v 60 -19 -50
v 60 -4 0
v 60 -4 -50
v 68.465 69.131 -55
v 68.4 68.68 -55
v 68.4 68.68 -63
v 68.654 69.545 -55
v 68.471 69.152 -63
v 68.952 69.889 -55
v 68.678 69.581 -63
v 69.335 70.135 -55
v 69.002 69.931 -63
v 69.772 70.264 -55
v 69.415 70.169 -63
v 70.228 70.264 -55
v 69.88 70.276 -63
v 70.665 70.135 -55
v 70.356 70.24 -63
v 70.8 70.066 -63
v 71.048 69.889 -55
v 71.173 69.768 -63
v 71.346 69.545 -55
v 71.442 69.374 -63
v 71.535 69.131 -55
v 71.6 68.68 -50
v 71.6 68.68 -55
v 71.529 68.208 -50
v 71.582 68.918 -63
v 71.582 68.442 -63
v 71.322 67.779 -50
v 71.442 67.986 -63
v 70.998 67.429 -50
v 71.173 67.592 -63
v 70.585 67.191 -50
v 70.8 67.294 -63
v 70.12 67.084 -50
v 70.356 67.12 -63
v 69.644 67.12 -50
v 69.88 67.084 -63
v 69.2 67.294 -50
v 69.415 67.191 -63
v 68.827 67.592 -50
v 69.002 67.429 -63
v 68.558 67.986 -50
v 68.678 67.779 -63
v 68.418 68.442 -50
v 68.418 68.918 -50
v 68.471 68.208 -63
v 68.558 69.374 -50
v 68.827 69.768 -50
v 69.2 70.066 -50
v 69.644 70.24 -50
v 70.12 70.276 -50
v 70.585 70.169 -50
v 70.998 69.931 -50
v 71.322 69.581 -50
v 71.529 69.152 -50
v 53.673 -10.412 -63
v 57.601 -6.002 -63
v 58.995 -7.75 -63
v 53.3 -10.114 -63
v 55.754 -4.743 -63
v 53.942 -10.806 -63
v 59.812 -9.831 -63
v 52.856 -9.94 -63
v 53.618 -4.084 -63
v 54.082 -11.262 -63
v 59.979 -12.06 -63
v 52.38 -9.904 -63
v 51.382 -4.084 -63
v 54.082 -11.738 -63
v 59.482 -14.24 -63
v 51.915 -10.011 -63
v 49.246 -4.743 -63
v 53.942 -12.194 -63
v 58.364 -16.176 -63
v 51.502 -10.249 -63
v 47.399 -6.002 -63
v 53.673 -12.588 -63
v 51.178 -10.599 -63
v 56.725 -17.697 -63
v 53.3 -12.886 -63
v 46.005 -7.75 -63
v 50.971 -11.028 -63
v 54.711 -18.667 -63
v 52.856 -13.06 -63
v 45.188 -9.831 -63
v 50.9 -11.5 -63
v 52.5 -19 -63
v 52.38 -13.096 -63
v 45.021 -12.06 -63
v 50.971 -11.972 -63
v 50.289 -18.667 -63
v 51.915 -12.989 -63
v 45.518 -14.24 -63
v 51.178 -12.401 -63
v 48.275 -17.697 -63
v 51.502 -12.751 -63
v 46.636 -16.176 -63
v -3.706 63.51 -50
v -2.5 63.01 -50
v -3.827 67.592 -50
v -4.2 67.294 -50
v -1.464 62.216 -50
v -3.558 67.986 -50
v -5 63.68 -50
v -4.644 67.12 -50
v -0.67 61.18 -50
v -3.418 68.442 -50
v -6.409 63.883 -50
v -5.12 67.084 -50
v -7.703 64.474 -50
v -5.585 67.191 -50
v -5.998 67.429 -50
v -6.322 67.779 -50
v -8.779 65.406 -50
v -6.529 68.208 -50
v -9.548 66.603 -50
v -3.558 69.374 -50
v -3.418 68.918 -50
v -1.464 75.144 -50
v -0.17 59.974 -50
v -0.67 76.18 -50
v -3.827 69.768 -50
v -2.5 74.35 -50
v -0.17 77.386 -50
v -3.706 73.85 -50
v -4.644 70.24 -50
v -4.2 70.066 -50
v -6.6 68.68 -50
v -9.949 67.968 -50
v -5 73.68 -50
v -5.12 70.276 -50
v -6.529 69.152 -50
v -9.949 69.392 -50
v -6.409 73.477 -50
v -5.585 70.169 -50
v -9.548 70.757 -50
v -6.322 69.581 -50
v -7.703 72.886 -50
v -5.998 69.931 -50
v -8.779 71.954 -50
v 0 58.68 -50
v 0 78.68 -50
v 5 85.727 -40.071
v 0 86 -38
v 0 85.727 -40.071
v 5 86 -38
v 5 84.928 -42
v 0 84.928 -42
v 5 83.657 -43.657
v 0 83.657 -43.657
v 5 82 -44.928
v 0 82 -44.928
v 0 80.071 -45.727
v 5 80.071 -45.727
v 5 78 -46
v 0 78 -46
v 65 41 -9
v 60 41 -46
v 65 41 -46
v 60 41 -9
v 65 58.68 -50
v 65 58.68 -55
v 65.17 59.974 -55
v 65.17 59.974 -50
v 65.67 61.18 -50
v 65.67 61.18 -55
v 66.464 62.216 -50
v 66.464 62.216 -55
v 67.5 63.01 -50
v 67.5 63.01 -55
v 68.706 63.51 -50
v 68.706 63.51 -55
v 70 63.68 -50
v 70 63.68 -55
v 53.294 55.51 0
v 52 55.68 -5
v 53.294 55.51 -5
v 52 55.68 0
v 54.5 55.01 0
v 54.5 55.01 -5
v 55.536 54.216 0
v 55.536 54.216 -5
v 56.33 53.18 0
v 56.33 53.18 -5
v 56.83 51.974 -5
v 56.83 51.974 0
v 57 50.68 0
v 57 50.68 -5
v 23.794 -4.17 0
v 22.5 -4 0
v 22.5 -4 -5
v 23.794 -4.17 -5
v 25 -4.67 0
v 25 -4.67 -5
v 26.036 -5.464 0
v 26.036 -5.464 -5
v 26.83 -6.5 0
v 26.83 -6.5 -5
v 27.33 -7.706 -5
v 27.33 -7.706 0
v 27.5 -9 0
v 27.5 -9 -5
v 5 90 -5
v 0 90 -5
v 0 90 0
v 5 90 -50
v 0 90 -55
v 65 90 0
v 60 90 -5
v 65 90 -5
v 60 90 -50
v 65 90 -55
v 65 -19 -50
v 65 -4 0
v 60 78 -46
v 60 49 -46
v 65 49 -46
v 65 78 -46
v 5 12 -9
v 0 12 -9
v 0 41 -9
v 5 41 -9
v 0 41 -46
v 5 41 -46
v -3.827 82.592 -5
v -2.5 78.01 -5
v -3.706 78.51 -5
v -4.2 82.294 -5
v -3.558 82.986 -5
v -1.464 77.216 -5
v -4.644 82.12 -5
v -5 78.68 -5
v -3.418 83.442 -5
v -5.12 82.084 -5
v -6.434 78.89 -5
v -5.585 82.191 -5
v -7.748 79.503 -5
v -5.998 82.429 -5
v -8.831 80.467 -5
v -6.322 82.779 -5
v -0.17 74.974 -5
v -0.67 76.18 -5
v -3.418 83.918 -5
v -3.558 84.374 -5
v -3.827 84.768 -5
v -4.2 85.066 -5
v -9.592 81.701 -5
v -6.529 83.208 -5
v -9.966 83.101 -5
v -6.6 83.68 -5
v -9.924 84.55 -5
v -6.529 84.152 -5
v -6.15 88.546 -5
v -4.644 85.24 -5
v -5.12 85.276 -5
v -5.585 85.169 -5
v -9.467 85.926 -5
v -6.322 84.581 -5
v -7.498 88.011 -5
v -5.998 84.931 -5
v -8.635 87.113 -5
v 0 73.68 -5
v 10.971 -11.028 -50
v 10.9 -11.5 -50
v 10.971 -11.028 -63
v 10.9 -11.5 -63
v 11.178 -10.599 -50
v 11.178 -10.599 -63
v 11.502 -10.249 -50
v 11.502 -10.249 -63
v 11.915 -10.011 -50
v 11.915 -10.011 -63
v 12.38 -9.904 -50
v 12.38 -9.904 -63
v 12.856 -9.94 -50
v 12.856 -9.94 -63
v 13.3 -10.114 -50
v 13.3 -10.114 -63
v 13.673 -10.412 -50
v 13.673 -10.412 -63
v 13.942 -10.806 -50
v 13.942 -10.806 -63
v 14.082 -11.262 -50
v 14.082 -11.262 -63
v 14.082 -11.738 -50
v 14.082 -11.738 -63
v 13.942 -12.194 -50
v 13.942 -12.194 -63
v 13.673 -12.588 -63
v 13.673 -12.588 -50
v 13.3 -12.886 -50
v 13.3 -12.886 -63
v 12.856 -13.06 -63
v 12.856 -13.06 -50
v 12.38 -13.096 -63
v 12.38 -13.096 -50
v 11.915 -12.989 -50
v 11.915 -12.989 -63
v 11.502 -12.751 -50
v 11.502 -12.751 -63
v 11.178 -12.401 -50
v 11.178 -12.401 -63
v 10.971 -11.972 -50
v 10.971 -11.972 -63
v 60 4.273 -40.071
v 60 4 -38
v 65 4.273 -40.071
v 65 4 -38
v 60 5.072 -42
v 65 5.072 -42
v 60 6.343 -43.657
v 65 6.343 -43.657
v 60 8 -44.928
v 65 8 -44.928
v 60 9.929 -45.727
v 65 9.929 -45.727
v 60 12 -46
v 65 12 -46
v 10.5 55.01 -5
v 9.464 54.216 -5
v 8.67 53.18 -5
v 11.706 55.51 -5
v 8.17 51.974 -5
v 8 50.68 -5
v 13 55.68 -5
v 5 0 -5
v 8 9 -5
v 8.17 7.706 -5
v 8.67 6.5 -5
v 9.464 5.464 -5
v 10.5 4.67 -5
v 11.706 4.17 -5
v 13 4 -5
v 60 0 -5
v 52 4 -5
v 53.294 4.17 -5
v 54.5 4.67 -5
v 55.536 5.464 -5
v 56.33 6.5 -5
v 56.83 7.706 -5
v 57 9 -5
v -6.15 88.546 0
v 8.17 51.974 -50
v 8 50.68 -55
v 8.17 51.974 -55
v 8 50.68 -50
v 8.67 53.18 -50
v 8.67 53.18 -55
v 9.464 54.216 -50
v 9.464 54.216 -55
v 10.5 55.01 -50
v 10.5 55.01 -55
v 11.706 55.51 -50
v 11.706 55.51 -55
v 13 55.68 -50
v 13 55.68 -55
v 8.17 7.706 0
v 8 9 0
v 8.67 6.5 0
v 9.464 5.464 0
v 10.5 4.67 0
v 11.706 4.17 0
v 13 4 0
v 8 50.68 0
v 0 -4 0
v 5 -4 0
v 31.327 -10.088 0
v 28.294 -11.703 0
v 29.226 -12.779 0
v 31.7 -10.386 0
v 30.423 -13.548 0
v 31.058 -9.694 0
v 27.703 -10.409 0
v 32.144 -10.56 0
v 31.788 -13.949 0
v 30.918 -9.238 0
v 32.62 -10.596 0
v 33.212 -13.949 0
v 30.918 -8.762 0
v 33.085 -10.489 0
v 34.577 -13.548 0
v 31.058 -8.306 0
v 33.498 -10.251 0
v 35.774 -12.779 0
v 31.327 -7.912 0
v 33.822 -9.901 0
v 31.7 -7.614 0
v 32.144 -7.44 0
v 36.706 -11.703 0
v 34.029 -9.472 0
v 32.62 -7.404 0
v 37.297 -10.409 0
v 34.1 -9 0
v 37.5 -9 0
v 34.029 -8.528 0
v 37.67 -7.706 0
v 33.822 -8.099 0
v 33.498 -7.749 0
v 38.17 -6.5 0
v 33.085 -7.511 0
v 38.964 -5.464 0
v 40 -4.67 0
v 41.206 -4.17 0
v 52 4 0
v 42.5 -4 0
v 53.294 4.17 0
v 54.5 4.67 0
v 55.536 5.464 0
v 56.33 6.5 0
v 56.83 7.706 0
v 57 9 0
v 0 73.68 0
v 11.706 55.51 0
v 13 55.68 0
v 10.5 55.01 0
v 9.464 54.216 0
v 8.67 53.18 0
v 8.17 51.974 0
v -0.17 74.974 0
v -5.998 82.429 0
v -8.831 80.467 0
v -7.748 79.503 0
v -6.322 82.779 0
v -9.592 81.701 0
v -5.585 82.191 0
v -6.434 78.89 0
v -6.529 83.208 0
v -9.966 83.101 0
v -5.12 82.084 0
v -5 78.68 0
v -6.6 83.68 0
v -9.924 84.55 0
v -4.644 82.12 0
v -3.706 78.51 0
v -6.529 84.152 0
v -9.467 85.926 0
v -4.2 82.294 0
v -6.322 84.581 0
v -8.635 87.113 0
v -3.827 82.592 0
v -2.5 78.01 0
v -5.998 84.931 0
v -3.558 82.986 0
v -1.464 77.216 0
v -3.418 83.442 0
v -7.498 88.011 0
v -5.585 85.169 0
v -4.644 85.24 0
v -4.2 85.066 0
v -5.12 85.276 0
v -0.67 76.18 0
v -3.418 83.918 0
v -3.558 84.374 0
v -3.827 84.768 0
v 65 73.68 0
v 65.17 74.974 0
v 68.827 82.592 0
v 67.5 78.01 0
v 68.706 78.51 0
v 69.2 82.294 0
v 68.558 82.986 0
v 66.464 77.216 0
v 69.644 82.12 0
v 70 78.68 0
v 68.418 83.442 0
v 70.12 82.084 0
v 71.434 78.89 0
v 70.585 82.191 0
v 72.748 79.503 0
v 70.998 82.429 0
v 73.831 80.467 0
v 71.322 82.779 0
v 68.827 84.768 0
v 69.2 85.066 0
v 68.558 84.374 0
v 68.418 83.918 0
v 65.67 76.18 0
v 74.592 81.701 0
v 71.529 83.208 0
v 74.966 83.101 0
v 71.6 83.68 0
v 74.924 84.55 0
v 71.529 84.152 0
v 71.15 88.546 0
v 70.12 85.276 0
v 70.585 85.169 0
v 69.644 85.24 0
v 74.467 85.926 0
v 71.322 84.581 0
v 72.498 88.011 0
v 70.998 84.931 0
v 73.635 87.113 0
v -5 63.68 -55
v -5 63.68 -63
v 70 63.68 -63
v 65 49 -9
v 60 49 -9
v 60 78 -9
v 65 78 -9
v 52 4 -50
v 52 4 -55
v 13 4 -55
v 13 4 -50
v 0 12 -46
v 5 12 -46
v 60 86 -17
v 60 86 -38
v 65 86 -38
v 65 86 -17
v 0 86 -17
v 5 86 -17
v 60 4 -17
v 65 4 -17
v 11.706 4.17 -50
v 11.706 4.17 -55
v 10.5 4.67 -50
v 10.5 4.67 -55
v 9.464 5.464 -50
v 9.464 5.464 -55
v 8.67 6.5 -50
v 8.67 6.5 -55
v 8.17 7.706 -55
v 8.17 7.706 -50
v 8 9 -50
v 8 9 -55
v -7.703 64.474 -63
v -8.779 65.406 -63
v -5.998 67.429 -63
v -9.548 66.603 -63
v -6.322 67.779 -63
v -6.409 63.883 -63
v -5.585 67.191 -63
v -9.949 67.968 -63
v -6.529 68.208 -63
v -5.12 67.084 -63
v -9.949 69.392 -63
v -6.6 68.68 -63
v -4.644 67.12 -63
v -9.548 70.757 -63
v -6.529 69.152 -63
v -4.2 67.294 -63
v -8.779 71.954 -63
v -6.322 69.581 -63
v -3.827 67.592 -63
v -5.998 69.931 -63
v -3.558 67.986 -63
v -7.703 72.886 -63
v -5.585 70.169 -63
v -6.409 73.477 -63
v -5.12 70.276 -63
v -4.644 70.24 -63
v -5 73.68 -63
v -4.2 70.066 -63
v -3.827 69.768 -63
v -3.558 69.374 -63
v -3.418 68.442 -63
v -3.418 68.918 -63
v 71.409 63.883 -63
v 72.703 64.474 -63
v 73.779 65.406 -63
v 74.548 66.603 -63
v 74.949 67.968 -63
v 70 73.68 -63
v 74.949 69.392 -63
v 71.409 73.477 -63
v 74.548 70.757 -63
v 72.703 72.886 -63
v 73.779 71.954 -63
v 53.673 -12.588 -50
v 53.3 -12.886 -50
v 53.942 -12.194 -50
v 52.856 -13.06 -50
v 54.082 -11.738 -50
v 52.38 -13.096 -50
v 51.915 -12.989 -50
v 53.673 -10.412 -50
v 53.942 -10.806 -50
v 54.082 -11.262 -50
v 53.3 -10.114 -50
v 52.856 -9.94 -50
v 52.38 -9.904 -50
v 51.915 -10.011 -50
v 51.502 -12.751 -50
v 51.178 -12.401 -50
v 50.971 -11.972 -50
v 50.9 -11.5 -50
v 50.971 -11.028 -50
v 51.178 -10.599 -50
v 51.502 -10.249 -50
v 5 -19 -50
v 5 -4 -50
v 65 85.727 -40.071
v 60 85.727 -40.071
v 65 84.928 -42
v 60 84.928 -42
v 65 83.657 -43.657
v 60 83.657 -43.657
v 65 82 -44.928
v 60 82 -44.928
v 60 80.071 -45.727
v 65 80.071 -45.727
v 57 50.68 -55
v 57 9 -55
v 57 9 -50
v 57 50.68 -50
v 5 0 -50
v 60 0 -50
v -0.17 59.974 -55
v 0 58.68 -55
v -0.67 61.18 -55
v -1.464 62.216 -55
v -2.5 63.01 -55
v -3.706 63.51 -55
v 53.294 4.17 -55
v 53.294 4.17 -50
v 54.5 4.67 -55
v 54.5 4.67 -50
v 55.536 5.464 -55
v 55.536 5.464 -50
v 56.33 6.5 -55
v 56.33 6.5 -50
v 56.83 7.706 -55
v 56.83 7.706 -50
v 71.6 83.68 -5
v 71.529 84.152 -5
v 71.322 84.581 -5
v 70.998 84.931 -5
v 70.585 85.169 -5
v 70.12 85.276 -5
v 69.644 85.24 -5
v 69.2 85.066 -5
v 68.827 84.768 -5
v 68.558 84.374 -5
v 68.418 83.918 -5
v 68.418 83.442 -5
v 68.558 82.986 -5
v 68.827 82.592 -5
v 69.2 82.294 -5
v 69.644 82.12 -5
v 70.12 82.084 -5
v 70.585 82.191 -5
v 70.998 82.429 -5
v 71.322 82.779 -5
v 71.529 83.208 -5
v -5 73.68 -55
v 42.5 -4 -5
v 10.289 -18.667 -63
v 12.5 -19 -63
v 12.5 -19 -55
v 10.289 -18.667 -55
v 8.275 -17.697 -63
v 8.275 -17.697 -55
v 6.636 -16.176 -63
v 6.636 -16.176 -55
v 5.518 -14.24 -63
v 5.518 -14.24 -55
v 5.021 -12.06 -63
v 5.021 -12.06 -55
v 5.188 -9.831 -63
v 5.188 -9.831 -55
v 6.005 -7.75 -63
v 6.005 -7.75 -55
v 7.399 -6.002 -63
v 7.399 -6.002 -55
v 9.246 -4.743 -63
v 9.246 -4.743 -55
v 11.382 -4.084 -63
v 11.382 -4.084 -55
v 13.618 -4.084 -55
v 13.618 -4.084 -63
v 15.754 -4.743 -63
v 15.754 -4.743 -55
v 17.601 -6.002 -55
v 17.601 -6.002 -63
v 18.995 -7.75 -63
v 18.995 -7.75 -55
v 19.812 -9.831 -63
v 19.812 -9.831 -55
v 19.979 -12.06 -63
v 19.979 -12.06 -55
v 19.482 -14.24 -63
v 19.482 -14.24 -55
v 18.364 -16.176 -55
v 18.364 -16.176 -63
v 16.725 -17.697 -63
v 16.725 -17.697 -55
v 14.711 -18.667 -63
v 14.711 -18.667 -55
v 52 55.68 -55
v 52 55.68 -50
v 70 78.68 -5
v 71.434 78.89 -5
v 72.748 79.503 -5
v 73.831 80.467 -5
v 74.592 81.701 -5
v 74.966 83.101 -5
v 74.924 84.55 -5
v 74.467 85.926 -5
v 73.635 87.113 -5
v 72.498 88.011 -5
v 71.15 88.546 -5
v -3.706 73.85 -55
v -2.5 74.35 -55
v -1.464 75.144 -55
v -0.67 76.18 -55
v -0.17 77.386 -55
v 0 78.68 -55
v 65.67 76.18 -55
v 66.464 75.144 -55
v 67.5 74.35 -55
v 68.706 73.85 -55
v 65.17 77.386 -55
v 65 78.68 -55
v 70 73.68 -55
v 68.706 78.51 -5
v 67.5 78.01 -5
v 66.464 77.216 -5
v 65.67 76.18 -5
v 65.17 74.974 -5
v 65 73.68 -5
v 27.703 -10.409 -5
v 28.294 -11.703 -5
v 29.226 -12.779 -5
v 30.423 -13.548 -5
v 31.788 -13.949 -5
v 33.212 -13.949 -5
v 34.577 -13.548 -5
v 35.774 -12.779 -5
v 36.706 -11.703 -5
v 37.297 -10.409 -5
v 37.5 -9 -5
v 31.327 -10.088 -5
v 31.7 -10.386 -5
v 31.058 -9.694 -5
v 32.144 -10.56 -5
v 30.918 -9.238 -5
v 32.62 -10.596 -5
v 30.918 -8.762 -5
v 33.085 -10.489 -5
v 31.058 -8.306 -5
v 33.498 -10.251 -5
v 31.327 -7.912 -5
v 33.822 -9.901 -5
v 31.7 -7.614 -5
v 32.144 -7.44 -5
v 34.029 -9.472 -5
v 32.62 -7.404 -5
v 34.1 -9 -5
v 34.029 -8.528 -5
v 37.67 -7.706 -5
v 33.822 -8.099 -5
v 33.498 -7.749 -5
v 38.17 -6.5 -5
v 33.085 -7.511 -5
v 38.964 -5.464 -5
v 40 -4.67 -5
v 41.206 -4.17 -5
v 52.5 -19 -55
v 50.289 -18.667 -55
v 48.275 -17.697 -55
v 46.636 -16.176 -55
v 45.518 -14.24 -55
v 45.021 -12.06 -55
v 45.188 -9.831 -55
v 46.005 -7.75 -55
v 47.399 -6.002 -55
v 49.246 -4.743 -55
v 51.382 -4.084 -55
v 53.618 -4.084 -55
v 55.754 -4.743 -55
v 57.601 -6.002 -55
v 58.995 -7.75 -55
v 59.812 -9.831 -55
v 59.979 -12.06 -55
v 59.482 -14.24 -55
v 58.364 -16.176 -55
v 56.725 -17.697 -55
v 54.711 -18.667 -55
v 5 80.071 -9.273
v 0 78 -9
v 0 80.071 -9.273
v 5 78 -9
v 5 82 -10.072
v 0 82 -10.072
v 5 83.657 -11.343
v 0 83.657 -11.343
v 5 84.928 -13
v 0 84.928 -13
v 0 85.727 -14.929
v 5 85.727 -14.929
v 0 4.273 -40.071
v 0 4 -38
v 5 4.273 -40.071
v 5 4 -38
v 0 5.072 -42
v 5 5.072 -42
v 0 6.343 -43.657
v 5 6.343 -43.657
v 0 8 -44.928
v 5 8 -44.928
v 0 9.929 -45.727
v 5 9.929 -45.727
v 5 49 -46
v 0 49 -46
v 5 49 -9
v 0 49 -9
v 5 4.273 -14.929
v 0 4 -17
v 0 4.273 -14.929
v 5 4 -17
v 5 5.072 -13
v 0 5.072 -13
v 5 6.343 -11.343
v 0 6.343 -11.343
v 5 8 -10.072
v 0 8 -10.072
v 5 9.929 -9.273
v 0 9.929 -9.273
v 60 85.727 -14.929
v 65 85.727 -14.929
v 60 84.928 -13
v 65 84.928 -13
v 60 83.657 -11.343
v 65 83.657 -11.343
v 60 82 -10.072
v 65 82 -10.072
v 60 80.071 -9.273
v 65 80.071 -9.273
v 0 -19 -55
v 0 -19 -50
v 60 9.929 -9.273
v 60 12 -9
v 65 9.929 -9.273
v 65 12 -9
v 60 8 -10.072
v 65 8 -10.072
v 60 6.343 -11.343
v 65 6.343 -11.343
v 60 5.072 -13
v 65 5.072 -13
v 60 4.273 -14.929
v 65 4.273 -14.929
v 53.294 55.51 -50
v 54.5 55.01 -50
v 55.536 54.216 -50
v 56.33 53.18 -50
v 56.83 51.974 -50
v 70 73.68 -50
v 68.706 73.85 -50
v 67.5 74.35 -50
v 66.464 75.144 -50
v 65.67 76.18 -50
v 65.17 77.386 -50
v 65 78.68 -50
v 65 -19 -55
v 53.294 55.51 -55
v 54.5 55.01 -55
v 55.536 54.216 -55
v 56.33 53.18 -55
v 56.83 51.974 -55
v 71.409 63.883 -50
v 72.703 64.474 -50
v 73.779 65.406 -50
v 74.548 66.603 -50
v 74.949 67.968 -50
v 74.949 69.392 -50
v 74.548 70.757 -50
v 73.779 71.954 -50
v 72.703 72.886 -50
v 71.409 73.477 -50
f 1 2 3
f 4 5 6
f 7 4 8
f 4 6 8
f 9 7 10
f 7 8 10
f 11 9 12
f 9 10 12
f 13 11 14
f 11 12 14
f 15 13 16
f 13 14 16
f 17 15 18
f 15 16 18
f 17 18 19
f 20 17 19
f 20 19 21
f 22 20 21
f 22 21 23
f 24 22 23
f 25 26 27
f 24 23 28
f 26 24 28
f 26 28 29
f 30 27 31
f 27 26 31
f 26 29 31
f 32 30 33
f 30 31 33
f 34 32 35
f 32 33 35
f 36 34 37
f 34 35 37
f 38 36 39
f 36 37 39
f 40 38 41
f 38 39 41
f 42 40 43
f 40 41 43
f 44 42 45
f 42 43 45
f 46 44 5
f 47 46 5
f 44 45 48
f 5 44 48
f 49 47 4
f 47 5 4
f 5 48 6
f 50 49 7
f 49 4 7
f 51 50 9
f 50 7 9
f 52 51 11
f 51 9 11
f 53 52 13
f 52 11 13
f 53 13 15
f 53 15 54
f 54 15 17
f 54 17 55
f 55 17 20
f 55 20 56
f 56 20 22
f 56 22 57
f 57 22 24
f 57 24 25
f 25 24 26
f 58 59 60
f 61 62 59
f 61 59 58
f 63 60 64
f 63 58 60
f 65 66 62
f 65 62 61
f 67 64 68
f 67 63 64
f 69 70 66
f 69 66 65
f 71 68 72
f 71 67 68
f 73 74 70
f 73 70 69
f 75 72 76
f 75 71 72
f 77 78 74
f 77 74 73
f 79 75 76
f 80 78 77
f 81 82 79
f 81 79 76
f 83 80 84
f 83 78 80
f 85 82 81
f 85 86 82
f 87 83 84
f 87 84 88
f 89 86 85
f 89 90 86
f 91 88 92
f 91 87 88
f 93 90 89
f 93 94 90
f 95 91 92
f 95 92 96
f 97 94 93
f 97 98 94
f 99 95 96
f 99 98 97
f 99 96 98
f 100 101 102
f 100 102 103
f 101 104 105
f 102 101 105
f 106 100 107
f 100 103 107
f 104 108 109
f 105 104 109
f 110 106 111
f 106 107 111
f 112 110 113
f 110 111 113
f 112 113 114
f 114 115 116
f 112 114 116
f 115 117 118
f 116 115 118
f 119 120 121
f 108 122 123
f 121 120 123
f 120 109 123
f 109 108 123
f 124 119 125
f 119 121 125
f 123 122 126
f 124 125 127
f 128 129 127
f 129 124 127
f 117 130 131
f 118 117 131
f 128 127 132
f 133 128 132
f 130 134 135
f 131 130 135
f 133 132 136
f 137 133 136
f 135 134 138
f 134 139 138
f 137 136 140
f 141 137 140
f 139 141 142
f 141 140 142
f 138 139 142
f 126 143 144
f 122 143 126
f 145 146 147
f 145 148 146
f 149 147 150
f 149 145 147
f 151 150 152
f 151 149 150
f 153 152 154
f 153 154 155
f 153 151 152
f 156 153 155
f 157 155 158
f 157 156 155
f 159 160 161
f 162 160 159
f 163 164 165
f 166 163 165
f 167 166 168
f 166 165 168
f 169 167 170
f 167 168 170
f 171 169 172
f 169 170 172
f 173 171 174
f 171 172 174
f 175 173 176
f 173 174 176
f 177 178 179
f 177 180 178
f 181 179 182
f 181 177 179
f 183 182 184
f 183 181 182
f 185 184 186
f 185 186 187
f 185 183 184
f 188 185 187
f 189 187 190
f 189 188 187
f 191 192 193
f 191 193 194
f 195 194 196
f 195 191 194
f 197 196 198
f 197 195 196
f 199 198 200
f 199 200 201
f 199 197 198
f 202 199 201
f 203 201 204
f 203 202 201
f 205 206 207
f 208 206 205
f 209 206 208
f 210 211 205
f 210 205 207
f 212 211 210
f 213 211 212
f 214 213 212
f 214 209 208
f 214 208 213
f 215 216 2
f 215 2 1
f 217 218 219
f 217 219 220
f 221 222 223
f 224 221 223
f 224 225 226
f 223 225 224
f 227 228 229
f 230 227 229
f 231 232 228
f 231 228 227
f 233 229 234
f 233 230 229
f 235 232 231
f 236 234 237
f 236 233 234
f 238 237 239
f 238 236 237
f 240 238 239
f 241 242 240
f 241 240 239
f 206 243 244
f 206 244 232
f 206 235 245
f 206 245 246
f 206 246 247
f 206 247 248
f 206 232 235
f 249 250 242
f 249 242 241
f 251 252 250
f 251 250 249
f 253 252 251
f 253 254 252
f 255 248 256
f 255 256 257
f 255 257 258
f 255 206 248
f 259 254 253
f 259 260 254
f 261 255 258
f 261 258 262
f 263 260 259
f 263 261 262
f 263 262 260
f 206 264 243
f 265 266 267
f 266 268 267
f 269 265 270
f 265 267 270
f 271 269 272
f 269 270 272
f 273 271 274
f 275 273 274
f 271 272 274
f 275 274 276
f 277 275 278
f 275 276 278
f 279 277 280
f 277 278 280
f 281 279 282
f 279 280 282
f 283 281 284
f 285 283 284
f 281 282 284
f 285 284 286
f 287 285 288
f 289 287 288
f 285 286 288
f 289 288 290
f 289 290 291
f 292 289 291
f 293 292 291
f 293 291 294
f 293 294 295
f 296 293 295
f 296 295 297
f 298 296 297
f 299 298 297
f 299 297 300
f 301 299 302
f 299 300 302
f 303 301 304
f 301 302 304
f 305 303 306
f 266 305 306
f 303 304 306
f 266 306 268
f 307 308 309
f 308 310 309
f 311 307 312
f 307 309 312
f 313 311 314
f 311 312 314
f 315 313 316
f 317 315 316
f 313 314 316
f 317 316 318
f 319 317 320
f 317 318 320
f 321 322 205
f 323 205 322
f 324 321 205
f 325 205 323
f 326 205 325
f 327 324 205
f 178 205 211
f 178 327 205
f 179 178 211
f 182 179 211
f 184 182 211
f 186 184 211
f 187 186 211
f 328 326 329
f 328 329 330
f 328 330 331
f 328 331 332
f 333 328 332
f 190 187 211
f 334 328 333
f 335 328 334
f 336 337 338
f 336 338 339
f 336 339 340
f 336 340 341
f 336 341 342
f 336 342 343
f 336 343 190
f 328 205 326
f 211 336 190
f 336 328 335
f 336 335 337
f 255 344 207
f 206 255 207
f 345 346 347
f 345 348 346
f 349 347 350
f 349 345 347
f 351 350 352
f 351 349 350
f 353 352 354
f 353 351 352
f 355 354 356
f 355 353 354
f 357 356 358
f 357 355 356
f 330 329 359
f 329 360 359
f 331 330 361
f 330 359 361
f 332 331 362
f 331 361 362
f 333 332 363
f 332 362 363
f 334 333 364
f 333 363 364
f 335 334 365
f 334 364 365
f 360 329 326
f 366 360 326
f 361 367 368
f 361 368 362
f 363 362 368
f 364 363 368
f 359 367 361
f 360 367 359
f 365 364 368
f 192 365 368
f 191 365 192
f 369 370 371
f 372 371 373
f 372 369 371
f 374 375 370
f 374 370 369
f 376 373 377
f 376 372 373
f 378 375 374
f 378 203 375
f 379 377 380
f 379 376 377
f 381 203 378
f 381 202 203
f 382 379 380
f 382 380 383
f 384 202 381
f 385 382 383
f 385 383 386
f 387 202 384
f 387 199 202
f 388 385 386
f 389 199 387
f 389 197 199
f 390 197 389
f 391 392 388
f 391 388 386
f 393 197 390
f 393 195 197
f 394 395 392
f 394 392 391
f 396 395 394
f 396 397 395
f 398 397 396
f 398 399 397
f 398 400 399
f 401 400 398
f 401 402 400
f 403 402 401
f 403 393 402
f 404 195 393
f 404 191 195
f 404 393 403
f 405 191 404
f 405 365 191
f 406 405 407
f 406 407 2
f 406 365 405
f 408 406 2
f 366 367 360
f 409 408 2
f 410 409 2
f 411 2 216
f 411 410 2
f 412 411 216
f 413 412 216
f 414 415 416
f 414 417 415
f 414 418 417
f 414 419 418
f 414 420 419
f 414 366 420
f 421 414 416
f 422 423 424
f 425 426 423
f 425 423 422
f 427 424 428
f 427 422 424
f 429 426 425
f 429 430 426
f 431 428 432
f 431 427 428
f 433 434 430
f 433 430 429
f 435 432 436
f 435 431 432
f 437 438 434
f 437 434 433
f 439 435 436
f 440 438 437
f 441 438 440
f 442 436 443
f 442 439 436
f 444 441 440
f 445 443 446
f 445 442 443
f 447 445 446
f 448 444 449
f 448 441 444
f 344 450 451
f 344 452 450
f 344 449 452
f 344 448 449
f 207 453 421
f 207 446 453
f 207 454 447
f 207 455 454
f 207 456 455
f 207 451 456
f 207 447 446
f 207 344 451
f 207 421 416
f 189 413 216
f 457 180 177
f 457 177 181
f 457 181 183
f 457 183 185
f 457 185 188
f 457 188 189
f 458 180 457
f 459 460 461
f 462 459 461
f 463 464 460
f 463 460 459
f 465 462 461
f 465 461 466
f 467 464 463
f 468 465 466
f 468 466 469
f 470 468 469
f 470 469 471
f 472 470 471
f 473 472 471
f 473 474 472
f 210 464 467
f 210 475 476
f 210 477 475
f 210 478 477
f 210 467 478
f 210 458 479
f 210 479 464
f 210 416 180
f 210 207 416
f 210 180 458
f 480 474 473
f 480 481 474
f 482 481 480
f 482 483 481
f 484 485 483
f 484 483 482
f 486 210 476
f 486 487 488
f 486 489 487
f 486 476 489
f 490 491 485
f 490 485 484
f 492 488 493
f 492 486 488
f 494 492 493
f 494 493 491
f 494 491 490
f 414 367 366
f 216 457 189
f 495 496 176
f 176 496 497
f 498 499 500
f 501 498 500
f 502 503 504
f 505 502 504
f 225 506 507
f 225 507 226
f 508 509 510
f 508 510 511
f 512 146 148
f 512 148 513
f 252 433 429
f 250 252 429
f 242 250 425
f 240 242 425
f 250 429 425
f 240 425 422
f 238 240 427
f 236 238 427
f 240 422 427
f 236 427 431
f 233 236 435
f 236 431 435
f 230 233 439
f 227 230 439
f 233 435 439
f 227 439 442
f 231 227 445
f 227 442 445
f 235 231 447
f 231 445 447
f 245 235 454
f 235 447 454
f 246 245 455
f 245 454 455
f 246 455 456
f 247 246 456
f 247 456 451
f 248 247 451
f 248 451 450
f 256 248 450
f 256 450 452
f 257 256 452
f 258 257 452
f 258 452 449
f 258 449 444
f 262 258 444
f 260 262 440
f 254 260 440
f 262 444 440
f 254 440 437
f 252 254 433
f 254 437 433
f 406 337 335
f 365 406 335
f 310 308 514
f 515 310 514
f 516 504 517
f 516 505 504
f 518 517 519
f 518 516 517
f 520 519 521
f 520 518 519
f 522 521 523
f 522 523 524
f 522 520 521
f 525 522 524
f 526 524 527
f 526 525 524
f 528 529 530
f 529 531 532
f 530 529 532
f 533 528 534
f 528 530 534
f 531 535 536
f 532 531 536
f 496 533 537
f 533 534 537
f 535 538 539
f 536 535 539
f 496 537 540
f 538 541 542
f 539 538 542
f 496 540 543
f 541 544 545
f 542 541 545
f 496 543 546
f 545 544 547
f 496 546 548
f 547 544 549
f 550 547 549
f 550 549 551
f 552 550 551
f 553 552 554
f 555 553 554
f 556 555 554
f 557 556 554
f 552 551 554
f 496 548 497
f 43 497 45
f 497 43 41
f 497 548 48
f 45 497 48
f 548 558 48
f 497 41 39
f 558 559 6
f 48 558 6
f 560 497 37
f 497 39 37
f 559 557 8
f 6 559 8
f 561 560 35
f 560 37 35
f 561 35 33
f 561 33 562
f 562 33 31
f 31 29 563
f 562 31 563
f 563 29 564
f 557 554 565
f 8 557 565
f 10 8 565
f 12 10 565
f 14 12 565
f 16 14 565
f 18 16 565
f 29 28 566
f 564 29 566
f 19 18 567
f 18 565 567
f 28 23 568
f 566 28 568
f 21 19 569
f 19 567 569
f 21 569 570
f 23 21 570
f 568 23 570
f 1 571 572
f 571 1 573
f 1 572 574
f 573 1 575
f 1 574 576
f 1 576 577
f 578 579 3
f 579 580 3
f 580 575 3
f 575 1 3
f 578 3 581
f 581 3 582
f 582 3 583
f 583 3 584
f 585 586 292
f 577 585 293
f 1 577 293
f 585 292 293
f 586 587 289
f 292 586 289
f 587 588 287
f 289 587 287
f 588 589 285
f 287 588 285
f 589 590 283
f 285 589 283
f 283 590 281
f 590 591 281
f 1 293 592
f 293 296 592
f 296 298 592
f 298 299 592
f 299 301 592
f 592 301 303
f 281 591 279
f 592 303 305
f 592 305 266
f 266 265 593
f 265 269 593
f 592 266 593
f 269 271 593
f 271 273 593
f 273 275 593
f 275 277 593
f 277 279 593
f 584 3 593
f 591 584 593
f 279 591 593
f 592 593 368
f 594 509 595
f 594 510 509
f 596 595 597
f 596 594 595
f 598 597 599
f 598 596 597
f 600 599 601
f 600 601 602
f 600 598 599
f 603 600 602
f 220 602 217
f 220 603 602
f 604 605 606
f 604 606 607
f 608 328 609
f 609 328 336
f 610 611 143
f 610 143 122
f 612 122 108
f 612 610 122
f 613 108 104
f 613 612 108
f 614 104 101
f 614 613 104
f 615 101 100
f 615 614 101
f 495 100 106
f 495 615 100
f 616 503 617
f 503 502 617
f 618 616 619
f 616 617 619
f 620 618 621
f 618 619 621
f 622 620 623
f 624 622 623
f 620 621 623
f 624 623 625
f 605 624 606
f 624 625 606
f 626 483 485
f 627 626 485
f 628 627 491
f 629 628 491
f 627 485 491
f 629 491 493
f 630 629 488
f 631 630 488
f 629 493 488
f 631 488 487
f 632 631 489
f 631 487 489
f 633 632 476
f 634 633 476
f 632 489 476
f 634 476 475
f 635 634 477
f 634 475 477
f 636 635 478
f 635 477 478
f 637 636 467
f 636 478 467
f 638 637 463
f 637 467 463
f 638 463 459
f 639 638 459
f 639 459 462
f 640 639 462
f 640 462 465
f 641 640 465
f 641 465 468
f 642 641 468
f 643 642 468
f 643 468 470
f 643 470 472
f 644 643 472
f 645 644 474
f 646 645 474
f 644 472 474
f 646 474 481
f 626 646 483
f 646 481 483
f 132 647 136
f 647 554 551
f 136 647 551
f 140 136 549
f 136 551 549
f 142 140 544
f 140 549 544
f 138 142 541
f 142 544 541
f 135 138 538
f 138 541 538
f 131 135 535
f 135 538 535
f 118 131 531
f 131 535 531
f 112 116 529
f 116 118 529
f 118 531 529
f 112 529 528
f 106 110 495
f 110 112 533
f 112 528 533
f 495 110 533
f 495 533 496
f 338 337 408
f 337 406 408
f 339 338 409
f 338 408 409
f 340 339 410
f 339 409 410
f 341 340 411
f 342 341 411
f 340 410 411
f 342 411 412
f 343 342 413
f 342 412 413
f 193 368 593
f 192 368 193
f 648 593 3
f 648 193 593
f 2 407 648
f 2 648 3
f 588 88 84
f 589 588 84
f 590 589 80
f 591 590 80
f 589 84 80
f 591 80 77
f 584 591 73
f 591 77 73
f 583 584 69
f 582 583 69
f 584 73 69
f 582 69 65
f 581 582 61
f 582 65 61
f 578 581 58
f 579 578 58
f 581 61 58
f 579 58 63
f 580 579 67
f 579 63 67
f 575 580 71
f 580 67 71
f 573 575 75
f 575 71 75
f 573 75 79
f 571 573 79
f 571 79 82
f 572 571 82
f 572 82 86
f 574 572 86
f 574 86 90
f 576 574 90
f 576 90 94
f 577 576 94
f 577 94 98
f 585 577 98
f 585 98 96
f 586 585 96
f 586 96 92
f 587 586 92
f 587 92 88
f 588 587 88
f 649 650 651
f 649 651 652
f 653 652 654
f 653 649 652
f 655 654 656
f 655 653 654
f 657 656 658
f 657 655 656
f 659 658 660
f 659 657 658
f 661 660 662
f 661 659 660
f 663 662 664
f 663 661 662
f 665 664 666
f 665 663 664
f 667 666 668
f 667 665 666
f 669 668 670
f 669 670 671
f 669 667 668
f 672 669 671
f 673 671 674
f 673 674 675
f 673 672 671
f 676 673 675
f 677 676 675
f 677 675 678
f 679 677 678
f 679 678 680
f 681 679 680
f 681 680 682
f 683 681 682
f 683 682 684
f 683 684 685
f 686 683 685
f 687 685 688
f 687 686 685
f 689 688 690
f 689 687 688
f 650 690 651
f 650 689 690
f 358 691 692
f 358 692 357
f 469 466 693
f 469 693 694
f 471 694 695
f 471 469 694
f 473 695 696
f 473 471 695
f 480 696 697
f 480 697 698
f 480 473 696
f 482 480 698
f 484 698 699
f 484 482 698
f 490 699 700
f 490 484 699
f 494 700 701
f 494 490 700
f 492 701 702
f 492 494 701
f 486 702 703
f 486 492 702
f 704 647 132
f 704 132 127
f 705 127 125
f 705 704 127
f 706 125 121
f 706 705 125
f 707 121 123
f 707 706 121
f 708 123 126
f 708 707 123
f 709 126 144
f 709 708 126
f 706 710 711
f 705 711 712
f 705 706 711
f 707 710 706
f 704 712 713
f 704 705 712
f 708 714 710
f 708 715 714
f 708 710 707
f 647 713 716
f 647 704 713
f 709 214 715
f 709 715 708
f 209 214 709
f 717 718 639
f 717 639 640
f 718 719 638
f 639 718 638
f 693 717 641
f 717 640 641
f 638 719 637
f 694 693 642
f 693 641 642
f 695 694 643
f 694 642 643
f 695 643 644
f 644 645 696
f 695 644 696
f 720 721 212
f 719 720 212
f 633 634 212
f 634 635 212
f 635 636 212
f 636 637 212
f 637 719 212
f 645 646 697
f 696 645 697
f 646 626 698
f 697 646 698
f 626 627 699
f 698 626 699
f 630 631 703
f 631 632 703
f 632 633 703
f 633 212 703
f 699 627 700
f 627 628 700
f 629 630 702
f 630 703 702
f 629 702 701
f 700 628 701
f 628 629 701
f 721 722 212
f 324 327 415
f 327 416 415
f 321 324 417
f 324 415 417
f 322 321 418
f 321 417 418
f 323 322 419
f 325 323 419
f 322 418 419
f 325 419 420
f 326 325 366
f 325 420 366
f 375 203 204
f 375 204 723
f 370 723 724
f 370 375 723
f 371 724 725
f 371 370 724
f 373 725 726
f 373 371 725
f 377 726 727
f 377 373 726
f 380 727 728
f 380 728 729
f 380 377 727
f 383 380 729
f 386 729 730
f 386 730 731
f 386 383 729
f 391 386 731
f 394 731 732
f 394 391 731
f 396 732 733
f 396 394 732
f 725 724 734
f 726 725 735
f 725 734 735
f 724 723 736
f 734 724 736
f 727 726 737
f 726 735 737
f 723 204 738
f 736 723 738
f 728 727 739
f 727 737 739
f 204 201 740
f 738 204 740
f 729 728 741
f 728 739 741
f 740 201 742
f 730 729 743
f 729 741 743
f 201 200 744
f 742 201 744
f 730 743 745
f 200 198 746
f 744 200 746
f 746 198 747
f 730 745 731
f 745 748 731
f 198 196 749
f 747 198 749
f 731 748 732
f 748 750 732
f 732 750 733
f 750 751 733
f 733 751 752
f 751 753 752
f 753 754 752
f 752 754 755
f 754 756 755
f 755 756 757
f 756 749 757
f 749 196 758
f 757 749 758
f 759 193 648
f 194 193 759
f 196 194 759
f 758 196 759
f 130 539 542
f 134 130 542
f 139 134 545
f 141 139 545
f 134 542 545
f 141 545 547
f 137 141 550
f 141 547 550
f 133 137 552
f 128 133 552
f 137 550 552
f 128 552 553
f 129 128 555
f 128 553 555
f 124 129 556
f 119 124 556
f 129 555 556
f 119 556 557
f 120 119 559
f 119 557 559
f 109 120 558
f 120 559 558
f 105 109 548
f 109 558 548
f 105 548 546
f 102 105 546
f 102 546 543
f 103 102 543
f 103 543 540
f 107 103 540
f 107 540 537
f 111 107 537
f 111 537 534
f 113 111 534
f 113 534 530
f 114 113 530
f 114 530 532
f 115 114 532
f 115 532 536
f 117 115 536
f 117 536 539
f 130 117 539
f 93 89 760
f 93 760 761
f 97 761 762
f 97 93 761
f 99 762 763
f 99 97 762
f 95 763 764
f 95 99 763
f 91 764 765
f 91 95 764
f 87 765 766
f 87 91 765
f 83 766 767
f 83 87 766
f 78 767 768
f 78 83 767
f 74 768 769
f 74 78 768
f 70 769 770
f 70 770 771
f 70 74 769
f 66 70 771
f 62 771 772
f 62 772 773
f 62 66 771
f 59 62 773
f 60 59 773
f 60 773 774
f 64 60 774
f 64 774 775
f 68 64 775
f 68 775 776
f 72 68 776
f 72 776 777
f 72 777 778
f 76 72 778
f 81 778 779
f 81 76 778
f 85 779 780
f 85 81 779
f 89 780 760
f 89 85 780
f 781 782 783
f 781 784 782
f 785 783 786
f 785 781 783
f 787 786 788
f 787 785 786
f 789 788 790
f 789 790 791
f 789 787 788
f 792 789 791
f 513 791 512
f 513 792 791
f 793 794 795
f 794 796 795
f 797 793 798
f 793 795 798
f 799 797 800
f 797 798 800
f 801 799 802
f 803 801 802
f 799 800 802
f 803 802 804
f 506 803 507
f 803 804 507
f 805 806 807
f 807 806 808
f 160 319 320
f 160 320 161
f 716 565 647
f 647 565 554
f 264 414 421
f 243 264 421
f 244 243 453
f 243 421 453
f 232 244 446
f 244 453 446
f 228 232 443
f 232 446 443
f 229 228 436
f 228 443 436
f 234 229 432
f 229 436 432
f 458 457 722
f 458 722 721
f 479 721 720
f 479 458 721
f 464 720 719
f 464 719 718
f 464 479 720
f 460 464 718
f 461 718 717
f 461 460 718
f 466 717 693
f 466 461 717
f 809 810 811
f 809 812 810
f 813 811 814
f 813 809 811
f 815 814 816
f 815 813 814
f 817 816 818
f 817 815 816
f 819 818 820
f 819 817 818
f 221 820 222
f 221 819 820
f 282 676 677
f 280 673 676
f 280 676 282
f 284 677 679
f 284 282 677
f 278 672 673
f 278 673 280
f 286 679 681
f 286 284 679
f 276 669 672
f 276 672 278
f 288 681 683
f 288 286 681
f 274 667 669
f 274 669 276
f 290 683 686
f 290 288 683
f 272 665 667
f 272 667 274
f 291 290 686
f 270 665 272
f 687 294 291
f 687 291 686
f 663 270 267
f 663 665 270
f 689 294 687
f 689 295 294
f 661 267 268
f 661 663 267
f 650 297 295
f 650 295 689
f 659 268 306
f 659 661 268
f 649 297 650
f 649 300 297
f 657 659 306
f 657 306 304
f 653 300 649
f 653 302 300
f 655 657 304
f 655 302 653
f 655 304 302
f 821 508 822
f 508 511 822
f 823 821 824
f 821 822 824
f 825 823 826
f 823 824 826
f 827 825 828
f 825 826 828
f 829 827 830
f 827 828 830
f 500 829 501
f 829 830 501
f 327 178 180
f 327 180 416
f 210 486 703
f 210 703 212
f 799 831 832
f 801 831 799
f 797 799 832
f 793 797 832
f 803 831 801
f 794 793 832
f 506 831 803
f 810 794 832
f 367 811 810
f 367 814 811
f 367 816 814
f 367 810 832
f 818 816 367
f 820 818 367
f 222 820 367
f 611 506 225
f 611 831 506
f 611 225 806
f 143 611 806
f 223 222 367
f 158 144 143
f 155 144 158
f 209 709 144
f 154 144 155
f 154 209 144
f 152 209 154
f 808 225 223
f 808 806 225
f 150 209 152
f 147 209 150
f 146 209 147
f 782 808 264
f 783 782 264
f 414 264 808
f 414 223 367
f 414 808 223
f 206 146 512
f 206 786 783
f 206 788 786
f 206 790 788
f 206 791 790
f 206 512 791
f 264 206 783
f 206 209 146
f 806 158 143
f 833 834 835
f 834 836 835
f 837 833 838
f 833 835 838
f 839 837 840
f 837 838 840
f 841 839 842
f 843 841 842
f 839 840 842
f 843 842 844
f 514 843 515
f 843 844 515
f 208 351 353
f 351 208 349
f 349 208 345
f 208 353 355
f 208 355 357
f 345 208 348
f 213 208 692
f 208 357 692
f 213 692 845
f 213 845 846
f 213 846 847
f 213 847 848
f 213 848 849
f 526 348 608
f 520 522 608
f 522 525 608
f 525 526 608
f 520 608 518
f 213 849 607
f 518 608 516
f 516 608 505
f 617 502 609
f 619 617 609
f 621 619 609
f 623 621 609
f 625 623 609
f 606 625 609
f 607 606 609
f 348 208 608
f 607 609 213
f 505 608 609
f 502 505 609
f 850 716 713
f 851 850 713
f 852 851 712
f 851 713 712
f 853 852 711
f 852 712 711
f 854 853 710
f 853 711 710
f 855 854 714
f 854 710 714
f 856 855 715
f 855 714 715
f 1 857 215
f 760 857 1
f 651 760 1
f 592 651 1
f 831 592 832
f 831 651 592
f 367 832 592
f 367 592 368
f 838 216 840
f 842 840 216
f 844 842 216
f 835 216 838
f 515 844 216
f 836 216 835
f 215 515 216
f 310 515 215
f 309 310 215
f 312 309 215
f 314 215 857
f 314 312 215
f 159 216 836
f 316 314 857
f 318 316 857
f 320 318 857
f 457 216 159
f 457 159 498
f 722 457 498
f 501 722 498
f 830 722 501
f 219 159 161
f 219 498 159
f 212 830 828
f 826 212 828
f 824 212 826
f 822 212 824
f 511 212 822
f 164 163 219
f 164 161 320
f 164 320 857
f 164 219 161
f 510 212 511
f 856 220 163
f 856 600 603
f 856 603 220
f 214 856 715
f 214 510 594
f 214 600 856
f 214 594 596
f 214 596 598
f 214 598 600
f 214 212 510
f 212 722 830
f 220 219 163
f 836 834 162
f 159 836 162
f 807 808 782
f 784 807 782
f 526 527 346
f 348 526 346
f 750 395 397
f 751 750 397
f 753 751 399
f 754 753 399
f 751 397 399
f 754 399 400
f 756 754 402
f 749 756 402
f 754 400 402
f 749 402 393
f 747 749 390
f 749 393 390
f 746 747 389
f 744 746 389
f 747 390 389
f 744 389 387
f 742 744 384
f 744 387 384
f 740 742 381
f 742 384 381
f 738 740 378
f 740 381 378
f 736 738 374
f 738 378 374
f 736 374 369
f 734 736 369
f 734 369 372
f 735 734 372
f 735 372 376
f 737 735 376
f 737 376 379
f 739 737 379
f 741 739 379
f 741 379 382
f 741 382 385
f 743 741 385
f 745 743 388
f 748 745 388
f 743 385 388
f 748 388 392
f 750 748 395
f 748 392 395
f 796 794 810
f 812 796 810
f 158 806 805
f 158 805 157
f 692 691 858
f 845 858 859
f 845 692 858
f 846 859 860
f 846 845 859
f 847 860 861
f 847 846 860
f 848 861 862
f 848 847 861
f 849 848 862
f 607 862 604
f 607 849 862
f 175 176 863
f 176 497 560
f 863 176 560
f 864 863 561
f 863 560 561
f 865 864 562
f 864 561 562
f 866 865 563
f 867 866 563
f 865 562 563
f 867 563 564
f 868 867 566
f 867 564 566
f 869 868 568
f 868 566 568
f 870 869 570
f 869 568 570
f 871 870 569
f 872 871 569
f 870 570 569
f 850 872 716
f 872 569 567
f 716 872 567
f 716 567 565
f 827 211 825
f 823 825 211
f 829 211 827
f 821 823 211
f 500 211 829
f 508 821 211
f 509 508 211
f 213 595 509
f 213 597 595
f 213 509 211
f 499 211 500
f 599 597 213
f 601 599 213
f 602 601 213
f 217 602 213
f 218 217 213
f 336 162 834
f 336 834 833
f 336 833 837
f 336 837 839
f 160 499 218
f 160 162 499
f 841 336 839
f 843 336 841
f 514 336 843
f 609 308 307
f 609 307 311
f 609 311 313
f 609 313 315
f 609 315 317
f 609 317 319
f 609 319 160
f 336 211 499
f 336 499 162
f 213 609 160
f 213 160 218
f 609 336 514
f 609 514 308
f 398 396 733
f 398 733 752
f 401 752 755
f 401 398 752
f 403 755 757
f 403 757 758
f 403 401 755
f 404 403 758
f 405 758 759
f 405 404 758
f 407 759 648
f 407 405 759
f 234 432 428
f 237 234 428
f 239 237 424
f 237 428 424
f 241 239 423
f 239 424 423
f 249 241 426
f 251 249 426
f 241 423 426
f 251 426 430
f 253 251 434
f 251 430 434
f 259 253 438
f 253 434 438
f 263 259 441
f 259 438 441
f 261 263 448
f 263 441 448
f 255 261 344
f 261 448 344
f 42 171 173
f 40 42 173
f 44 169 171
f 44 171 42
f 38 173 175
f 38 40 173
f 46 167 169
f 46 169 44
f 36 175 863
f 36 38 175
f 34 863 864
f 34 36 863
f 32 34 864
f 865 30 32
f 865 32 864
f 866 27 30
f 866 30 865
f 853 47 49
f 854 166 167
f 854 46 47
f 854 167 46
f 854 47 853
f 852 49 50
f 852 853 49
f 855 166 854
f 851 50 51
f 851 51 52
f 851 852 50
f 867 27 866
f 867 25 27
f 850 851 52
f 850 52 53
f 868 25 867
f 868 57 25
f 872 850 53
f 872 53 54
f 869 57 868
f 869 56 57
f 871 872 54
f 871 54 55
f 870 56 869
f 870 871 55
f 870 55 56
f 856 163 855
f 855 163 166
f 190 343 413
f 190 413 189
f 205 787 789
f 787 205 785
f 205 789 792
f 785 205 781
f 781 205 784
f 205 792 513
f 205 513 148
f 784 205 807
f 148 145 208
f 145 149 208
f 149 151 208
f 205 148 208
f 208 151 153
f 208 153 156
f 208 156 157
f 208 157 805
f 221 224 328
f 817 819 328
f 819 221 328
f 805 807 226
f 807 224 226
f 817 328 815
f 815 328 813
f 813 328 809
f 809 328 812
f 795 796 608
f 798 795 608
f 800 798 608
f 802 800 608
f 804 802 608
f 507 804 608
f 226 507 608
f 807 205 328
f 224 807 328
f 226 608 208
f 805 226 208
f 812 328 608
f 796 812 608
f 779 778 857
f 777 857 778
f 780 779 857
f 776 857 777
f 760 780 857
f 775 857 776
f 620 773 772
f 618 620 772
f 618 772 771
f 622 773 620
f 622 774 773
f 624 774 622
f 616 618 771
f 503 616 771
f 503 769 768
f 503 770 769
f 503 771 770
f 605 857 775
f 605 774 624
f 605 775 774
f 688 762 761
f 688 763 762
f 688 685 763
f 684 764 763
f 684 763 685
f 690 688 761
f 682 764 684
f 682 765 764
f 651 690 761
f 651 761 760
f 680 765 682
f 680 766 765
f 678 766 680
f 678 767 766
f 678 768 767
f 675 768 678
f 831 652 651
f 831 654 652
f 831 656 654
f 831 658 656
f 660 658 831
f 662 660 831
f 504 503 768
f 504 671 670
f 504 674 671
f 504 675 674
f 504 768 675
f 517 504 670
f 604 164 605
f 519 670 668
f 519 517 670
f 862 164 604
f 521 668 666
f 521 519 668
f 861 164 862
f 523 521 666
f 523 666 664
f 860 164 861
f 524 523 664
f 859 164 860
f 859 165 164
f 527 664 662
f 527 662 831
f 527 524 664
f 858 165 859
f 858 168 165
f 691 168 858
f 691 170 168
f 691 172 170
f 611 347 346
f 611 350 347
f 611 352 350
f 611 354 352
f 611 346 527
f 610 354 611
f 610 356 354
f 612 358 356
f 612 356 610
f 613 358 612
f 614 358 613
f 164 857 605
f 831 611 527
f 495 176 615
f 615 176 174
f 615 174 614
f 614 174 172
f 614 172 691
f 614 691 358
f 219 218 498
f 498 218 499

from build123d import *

# Parameters (mm, degrees)
SKETCH_1_W          = 65
SKETCH_1_H          = 55
SKETCH_1_W_2        = 55
SKETCH_1_H_2        = 45
EXTRUDE_1_DEPTH     = 90
SKETCH_2_W          = 65
SKETCH_2_H          = 55
EXTRUDE_2_DEPTH     = 4
SKETCH_3_W          = 65
SKETCH_3_H          = 15
EXTRUDE_3_DEPTH     = 5
EXTRUDE_4_DEPTH     = 5
EXTRUDE_5_DEPTH     = 5
SKETCH_6_R          = 1.6
CUT_EXTRUDE_1_DEPTH = 124.895116934
SKETCH_7_R          = 1.6
EXTRUDE_6_DEPTH     = 5
SKETCH_8_R          = 1.6
EXTRUDE_7_DEPTH     = 5
EXTRUDE_START       = 8
SKETCH_9_R          = 7.5
SKETCH_9_R_2        = 1.6
EXTRUDE_9_DEPTH     = 8
SKETCH_10_W         = 49
SKETCH_10_H         = 51.68
CUT_EXTRUDE_2_DEPTH = 130.421791055
SKETCH_12_W         = 37
SKETCH_12_H         = 37
CUT_EXTRUDE_3_DEPTH = 134.018795664
FILLET_2_R          = 8
FILLET_3_R          = 5


with BuildPart() as part:
    # 草图1 → 凸台-拉伸1 (new body)
    with BuildSketch(Plane(origin=(0, 0, 0), x_dir=(1, 0, 0), z_dir=(0, 1, 0))):
        with Locations((32.5, 27.5)):
            Rectangle(SKETCH_1_W, SKETCH_1_H)
        with Locations((32.5, 27.5)):
            Rectangle(SKETCH_1_W_2, SKETCH_1_H_2, mode=Mode.SUBTRACT)
    extrude(amount=EXTRUDE_1_DEPTH)

    # 草图2 → 凸台-拉伸2 (add)
    with BuildSketch(Plane.XZ):
        with Locations((32.5, -27.5)):
            Rectangle(SKETCH_2_W, SKETCH_2_H)
    extrude(amount=EXTRUDE_2_DEPTH)

    # 草图3 → 凸台-拉伸3 (add)
    with BuildSketch(Plane(origin=(0, 0, -55), x_dir=(-1, 0, 0), z_dir=(0, 0, -1))):
        with Locations((-32.5, -11.5)):
            Rectangle(SKETCH_3_W, SKETCH_3_H)
    extrude(amount=-EXTRUDE_3_DEPTH)

    # 草图4 → 凸台-拉伸4 (add)
    with BuildSketch(Plane(origin=(65, 0, 0), x_dir=(0, 0, -1), z_dir=(1, 0, 0))):
        Polygon((0, -4), (50, -19), (50, -4), align=None)
    extrude(amount=-EXTRUDE_4_DEPTH)

    # 草图5 → 凸台-拉伸5 (add)
    with BuildSketch(Plane.ZY):
        Polygon((-50, -19), (0, -4), (-50, -4), align=None)
    extrude(amount=-EXTRUDE_5_DEPTH)

    # 草图6 → 切除-拉伸1 (cut, through all)
    with BuildSketch(Plane(origin=(0, 0, -55), x_dir=(-1, 0, 0), z_dir=(0, 0, -1))):
        with Locations((-12.5, -11.5)):
            Circle(SKETCH_6_R)
        with Locations((-52.5, -11.5)):
            Circle(SKETCH_6_R)
    extrude(amount=-CUT_EXTRUDE_1_DEPTH, mode=Mode.SUBTRACT)

    # 草图7 → 凸台-拉伸6 (add)
    # profile 1 of 2: a face of its own
    with BuildSketch(Plane(origin=(0, 0, -55), x_dir=(-1, 0, 0), z_dir=(0, 0, -1))):
        with BuildLine():
            Line((0, 78.68), (0, 58.68))
            ThreePointArc((0, 58.68), (1.464466094, 62.215533906), (5, 63.68))
            ThreePointArc((5, 63.68), (10, 68.68), (5, 73.68))
            ThreePointArc((5, 73.68), (1.464466094, 75.144466094), (0, 78.68))
        make_face()
        with Locations((5, 68.68)):
            Circle(SKETCH_7_R, mode=Mode.SUBTRACT)
    # profile 2 of 2: a face of its own
    with BuildSketch(Plane(origin=(0, 0, -55), x_dir=(-1, 0, 0), z_dir=(0, 0, -1))):
        with BuildLine():
            Line((-65, 78.68), (-65, 58.68))
            ThreePointArc((-65, 58.68), (-66.464466094, 62.215533906), (-70, 63.68))
            ThreePointArc((-70, 63.68), (-75, 68.68), (-70, 73.68))
            ThreePointArc((-70, 73.68), (-66.464466094, 75.144466094), (-65, 78.68))
        make_face()
        with Locations(Location((-70, 68.68, 0), (0, 0, 180))):
            Circle(SKETCH_7_R, mode=Mode.SUBTRACT)
    extrude(amount=-EXTRUDE_6_DEPTH)

    # 草图8 → 凸台-拉伸7 (add)
    # profile 1 of 3: a face of its own
    with BuildSketch(Plane.XY):
        with BuildLine():
            Line((71.150434847, 88.545850354), (65, 90))
            Line((65, 90), (65, 73.68))
            ThreePointArc((65, 73.68), (66.464466094, 77.215533906), (70, 78.68))
            ThreePointArc((70, 78.68), (74.966349352, 83.100885058), (71.150434847, 88.545850354))
        make_face()
        with Locations((70, 83.68)):
            Circle(SKETCH_8_R, mode=Mode.SUBTRACT)
    # profile 2 of 3: a face of its own
    with BuildSketch(Plane.XY):
        with BuildLine():
            Line((0, 90), (0, 73.68))
            ThreePointArc((0, 73.68), (-1.464466094, 77.215533906), (-5, 78.68))
            ThreePointArc((-5, 78.68), (-9.966349352, 83.100885058), (-6.150434847, 88.545850354))
            Line((-6.150434847, 88.545850354), (0, 90))
        make_face()
        with Locations(Location((-5, 83.68, 0), (0, 0, 180))):
            Circle(SKETCH_8_R, mode=Mode.SUBTRACT)
    # profile 3 of 3: a face of its own
    with BuildSketch(Plane.XY):
        with BuildLine():
            Line((42.5, -4), (22.5, -4))
            ThreePointArc((22.5, -4), (26.035533906, -5.464466094), (27.5, -9))
            ThreePointArc((27.5, -9), (32.5, -14), (37.5, -9))
            ThreePointArc((37.5, -9), (38.964466094, -5.464466094), (42.5, -4))
        make_face()
        with Locations((32.5, -9)):
            Circle(SKETCH_8_R, mode=Mode.SUBTRACT)
    extrude(amount=-EXTRUDE_7_DEPTH)

    # 草图9 → 凸台-拉伸9 (add)
    # profile 1 of 3: a face of its own
    with BuildSketch(Plane(origin=(0, 0, -55), x_dir=(-1, 0, 0), z_dir=(0, 0, -1)).offset(EXTRUDE_START)):
        with Locations(Location((-52.5, -11.5, 0), (0, 0, 270))):
            Circle(SKETCH_9_R)
        with Locations((-52.5, -11.5)):
            Circle(SKETCH_9_R_2, mode=Mode.SUBTRACT)
    # profile 2 of 3: a face of its own
    with BuildSketch(Plane(origin=(0, 0, -55), x_dir=(-1, 0, 0), z_dir=(0, 0, -1)).offset(EXTRUDE_START)):
        with Locations(Location((-12.5, -11.5, 0), (0, 0, 270))):
            Circle(SKETCH_9_R)
        with Locations((-12.5, -11.5)):
            Circle(SKETCH_9_R_2, mode=Mode.SUBTRACT)
    # profile 3 of 3: a face of its own
    with BuildSketch(Plane(origin=(0, 0, -55), x_dir=(-1, 0, 0), z_dir=(0, 0, -1)).offset(EXTRUDE_START)):
        with BuildLine():
            Line((-70, 73.68), (5, 73.68))
            ThreePointArc((5, 73.68), (10, 68.68), (5, 63.68))
            Line((5, 63.68), (-70, 63.68))
            ThreePointArc((-70, 63.68), (-75, 68.68), (-70, 73.68))
        make_face()
        with Locations((5, 68.68)):
            Circle(SKETCH_9_R_2, mode=Mode.SUBTRACT)
        with Locations((-70, 68.68)):
            Circle(SKETCH_9_R_2, mode=Mode.SUBTRACT)
    extrude(amount=-EXTRUDE_9_DEPTH)

    # 草图10 → 切除-拉伸2 (cut, through all)
    with BuildSketch(Plane(origin=(0, 0, -55), x_dir=(-1, 0, 0), z_dir=(0, 0, -1))):
        with Locations((-32.5, 29.84)):
            Rectangle(SKETCH_10_W, SKETCH_10_H)
    extrude(amount=-CUT_EXTRUDE_2_DEPTH, mode=Mode.SUBTRACT)

    # 草图12 → 切除-拉伸3 (cut, through all)
    with BuildSketch(Plane.ZY):
        with Locations((-27.5, 67.5)):
            Rectangle(SKETCH_12_W, SKETCH_12_H)
        with Locations((-27.5, 22.5)):
            Rectangle(SKETCH_12_W, SKETCH_12_H)
    extrude(amount=-CUT_EXTRUDE_3_DEPTH, mode=Mode.SUBTRACT)

    # 圆角2
    fillet_2_edges = [part.edges().sort_by_distance(p)[0] for p in [
        (62.5, 4, -46),
        (2.5, 4, -46),
        (62.5, 4, -9),
        (2.5, 4, -9),
        (62.5, 86, -46),
        (2.5, 86, -46),
        (62.5, 86, -9),
        (2.5, 86, -9),
    ]]
    fillet(fillet_2_edges, radius=FILLET_2_R)

    # 圆角3
    fillet_3_edges = [part.edges().sort_by_distance(p)[0] for p in [
        (57, 55.68, -2.5),
        (8, 55.68, -2.5),
        (8, 4, -2.5),
        (57, 4, -2.5),
        (57, 55.68, -52.5),
        (8, 55.68, -52.5),
        (8, 4, -52.5),
        (57, 4, -52.5),
    ]]
    fillet(fillet_3_edges, radius=FILLET_3_R)


solid = part.part
